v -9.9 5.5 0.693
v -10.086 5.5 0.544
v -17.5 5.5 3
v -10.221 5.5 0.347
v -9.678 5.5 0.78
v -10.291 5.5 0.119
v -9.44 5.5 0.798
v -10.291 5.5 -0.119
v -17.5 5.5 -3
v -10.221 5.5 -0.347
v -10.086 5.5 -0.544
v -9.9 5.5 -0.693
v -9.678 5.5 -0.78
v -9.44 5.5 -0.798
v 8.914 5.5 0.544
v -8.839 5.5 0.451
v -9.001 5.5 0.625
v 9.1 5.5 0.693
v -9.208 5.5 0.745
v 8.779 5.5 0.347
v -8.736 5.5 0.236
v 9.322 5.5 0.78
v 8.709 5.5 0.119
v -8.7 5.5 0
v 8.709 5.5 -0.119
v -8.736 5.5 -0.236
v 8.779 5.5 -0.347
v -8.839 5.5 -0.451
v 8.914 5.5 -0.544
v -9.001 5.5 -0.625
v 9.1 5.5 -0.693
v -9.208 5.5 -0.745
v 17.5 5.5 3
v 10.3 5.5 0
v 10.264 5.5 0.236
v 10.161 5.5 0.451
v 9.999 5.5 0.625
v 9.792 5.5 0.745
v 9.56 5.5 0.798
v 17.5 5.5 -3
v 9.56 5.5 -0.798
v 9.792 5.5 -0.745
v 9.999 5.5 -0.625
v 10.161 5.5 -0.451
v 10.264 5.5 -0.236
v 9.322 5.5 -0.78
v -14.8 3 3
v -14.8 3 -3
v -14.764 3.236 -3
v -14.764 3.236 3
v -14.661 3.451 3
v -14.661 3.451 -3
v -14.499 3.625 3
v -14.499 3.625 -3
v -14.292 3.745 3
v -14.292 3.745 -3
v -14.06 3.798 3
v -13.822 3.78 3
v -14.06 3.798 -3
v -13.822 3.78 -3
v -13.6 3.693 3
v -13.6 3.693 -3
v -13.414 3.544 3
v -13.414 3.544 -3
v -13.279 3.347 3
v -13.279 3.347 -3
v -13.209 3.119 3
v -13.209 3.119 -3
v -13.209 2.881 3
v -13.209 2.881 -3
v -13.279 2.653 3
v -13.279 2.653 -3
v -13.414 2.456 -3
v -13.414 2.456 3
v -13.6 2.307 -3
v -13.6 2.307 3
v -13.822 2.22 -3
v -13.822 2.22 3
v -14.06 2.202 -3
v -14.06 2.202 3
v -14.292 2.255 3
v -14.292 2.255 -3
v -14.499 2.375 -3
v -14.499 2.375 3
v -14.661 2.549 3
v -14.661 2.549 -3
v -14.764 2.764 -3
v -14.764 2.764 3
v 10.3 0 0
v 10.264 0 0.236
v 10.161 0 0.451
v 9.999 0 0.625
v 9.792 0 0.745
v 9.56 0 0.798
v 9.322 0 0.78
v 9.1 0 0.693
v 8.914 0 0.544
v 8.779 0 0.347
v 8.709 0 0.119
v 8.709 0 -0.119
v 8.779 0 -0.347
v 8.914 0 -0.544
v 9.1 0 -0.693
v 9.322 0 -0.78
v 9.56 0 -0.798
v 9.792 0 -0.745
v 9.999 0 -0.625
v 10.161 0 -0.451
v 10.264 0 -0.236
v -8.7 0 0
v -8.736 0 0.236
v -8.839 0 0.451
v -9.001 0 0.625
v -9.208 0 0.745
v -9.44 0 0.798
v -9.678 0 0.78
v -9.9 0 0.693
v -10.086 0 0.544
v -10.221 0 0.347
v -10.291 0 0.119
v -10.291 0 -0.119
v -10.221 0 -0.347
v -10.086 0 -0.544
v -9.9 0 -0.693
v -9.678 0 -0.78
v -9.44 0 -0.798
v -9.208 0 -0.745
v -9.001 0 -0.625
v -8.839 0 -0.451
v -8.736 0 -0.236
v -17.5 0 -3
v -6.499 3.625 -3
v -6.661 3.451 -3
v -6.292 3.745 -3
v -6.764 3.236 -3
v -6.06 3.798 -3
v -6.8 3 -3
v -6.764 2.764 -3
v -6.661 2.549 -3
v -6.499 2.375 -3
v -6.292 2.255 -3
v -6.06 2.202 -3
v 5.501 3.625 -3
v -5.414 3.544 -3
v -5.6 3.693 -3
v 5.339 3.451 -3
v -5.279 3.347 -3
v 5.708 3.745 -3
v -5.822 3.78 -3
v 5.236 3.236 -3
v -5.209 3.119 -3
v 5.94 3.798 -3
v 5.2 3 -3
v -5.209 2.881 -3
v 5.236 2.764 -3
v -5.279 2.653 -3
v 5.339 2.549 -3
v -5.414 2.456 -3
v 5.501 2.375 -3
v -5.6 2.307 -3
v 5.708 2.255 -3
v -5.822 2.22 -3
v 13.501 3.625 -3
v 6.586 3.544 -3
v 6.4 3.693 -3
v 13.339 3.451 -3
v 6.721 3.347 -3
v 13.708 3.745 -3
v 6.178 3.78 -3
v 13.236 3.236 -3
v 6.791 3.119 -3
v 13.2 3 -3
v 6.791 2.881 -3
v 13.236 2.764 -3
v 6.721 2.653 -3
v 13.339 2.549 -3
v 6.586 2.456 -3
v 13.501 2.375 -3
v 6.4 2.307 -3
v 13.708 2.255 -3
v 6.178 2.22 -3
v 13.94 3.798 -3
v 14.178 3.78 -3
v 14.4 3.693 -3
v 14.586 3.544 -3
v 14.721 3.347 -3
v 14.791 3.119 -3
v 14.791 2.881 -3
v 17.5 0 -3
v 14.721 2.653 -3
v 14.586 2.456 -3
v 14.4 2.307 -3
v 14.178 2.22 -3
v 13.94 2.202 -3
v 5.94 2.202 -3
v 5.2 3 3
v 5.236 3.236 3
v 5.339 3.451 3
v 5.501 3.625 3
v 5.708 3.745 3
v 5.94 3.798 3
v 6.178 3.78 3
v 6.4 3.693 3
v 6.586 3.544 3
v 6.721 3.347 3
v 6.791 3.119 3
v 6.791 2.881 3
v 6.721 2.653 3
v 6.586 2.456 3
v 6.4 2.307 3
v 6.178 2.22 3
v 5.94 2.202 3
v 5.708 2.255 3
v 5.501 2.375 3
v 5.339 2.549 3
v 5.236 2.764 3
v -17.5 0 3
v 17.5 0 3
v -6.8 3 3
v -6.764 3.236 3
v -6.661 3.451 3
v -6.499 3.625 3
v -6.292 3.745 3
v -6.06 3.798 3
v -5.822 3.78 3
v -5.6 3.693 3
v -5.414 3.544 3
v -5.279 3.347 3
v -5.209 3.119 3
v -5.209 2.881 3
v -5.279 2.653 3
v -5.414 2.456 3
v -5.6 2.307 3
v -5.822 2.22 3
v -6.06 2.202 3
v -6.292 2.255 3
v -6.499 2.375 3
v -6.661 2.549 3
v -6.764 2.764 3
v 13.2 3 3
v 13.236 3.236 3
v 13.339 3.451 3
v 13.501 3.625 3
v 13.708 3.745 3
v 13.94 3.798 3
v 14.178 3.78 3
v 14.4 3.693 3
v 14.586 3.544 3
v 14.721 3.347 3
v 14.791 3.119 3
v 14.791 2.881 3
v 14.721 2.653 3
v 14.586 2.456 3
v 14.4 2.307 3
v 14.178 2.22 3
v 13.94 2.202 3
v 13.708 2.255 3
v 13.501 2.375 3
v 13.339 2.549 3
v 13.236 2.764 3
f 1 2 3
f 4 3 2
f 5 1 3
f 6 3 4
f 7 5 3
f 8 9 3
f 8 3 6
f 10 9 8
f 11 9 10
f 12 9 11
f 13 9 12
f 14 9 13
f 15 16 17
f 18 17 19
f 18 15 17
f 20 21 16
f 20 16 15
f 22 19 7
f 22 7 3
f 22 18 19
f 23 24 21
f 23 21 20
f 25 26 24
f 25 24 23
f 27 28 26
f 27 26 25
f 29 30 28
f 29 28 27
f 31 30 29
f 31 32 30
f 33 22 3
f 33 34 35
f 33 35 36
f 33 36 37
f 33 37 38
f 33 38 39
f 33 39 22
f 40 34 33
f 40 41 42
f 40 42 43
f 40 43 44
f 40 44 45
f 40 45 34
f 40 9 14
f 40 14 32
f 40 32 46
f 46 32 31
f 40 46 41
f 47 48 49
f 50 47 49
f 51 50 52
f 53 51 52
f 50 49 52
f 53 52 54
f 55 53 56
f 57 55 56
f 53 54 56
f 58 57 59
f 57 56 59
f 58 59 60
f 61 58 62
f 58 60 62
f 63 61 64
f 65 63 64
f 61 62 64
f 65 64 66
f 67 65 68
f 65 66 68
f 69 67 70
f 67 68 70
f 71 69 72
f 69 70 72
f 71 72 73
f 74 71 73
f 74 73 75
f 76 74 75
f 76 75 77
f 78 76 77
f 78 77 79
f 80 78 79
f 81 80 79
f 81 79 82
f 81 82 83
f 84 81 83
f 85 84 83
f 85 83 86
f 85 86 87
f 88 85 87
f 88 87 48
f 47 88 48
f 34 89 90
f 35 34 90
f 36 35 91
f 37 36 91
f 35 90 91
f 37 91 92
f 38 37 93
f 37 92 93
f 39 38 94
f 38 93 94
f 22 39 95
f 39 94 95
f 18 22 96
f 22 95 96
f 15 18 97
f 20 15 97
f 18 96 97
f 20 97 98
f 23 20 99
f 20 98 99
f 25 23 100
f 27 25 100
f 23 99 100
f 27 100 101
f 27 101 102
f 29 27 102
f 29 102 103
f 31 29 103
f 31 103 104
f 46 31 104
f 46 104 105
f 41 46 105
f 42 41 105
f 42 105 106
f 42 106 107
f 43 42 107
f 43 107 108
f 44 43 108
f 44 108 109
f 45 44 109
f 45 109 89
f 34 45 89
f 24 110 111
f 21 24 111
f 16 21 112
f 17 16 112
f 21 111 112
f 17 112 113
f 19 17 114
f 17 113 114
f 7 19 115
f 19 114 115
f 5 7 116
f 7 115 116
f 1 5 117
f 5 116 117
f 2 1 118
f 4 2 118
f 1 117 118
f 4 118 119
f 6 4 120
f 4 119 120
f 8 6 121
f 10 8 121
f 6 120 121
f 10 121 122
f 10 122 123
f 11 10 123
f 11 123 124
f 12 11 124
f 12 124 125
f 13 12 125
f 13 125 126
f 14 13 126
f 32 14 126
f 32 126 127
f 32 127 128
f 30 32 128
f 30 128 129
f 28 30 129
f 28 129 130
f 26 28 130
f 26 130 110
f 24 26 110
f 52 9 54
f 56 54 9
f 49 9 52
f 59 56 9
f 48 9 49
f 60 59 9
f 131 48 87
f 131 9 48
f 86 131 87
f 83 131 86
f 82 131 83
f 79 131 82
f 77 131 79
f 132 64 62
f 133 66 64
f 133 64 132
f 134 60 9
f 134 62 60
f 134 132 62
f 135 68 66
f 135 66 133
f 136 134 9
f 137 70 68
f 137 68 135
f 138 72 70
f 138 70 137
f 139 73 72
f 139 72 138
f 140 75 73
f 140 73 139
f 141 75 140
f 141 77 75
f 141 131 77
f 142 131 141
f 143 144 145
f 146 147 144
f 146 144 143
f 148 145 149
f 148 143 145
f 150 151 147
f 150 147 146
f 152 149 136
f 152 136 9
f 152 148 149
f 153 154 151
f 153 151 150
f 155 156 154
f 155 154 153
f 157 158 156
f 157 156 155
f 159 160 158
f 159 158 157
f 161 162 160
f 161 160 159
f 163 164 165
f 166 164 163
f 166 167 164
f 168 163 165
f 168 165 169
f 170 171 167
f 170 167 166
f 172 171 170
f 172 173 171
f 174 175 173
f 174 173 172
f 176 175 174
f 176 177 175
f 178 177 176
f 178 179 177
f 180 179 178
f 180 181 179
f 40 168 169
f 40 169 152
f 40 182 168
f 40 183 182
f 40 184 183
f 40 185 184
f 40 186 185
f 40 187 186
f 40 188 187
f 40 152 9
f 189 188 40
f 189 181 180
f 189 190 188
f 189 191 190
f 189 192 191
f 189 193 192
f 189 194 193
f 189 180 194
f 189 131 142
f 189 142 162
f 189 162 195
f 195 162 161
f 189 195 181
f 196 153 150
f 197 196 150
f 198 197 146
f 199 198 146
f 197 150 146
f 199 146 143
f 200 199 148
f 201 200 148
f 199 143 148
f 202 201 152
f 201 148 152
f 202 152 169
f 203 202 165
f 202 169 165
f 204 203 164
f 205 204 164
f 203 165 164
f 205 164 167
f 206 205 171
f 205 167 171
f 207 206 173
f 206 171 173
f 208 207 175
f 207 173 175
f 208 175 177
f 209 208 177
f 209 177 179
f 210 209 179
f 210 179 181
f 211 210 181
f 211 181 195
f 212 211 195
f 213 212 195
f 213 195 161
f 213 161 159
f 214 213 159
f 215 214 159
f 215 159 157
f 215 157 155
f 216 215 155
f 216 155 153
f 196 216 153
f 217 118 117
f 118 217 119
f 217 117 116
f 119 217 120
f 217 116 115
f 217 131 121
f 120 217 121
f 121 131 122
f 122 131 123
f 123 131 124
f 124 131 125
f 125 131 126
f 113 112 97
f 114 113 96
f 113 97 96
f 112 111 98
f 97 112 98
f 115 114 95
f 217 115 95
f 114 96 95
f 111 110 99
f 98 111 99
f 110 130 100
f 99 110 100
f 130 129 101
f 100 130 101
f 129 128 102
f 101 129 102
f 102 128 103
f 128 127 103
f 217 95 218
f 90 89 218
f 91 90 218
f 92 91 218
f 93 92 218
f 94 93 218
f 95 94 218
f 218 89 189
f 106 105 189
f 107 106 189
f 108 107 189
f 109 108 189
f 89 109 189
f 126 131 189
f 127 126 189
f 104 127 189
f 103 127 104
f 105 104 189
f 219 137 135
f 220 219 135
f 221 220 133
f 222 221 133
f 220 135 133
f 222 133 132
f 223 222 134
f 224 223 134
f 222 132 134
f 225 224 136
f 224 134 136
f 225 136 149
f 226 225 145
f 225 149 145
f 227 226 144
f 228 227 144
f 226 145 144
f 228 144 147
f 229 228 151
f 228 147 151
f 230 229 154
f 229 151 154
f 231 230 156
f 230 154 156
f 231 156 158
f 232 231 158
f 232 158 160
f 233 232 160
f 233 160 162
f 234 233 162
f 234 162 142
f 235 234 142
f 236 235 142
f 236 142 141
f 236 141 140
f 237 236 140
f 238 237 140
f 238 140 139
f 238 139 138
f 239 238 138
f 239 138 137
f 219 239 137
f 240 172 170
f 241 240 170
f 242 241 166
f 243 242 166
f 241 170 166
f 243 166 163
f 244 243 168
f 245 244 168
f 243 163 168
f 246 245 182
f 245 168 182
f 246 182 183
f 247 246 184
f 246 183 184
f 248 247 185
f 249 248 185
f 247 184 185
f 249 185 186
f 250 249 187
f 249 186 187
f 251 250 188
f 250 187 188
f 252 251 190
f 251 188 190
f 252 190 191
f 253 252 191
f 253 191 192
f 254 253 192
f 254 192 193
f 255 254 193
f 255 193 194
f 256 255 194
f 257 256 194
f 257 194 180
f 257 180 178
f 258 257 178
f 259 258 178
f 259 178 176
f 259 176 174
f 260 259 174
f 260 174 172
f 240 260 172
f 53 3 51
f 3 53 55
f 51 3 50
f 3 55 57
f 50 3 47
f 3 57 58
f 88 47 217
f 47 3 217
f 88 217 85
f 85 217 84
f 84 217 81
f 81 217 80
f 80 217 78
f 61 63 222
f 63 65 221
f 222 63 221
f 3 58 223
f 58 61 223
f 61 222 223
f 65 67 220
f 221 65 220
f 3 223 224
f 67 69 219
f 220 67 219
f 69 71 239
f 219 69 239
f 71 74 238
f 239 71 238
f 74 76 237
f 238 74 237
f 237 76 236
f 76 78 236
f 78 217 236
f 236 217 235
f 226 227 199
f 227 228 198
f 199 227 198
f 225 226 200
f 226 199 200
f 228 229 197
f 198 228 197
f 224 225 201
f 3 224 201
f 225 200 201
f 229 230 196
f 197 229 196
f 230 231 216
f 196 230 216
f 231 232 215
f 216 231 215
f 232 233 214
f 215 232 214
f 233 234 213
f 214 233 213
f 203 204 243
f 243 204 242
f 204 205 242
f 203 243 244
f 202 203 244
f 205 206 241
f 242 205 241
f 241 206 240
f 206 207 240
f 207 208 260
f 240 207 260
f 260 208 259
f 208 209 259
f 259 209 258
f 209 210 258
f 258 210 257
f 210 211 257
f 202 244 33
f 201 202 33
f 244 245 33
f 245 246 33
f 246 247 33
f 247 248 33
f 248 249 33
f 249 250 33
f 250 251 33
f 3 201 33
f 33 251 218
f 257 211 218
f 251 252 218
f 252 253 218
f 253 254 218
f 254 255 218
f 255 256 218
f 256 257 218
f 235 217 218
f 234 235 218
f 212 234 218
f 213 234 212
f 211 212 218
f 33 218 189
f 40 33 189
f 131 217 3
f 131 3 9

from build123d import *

# Parameters (mm, degrees)
SKETCH1_W             = 35
SKETCH1_H             = 6
BOSS_EXTRUDE1_DEPTH   = 5.5
M2X0_4_TAPPED_HOLE1_D = 1.6
M2X0_4_TAPPED_HOLE2_D = 1.6


with BuildPart() as part:
    # Sketch1 → Boss-Extrude1 (new body)
    with BuildSketch(Plane(origin=(0, 0, 0), x_dir=(1, 0, 0), z_dir=(0, 1, 0))):
        Rectangle(SKETCH1_W, SKETCH1_H)
    extrude(amount=BOSS_EXTRUDE1_DEPTH)

    # M2x0.4 Tapped Hole1 (through all)
    with Locations(Plane.XY.offset(3)):
        with Locations((6, 3), (-14, 3), (-6, 3), (14, 3)):
            Hole(M2X0_4_TAPPED_HOLE1_D / 2)

    # M2x0.4 Tapped Hole2 (through all)
    with Locations(Plane(origin=(0, 5.5, 0), x_dir=(-1, 0, 0), z_dir=(0, 1, 0))):
        with Locations((9.5, 0), (-9.5, 0)):
            Hole(M2X0_4_TAPPED_HOLE2_D / 2)


solid = part.part
